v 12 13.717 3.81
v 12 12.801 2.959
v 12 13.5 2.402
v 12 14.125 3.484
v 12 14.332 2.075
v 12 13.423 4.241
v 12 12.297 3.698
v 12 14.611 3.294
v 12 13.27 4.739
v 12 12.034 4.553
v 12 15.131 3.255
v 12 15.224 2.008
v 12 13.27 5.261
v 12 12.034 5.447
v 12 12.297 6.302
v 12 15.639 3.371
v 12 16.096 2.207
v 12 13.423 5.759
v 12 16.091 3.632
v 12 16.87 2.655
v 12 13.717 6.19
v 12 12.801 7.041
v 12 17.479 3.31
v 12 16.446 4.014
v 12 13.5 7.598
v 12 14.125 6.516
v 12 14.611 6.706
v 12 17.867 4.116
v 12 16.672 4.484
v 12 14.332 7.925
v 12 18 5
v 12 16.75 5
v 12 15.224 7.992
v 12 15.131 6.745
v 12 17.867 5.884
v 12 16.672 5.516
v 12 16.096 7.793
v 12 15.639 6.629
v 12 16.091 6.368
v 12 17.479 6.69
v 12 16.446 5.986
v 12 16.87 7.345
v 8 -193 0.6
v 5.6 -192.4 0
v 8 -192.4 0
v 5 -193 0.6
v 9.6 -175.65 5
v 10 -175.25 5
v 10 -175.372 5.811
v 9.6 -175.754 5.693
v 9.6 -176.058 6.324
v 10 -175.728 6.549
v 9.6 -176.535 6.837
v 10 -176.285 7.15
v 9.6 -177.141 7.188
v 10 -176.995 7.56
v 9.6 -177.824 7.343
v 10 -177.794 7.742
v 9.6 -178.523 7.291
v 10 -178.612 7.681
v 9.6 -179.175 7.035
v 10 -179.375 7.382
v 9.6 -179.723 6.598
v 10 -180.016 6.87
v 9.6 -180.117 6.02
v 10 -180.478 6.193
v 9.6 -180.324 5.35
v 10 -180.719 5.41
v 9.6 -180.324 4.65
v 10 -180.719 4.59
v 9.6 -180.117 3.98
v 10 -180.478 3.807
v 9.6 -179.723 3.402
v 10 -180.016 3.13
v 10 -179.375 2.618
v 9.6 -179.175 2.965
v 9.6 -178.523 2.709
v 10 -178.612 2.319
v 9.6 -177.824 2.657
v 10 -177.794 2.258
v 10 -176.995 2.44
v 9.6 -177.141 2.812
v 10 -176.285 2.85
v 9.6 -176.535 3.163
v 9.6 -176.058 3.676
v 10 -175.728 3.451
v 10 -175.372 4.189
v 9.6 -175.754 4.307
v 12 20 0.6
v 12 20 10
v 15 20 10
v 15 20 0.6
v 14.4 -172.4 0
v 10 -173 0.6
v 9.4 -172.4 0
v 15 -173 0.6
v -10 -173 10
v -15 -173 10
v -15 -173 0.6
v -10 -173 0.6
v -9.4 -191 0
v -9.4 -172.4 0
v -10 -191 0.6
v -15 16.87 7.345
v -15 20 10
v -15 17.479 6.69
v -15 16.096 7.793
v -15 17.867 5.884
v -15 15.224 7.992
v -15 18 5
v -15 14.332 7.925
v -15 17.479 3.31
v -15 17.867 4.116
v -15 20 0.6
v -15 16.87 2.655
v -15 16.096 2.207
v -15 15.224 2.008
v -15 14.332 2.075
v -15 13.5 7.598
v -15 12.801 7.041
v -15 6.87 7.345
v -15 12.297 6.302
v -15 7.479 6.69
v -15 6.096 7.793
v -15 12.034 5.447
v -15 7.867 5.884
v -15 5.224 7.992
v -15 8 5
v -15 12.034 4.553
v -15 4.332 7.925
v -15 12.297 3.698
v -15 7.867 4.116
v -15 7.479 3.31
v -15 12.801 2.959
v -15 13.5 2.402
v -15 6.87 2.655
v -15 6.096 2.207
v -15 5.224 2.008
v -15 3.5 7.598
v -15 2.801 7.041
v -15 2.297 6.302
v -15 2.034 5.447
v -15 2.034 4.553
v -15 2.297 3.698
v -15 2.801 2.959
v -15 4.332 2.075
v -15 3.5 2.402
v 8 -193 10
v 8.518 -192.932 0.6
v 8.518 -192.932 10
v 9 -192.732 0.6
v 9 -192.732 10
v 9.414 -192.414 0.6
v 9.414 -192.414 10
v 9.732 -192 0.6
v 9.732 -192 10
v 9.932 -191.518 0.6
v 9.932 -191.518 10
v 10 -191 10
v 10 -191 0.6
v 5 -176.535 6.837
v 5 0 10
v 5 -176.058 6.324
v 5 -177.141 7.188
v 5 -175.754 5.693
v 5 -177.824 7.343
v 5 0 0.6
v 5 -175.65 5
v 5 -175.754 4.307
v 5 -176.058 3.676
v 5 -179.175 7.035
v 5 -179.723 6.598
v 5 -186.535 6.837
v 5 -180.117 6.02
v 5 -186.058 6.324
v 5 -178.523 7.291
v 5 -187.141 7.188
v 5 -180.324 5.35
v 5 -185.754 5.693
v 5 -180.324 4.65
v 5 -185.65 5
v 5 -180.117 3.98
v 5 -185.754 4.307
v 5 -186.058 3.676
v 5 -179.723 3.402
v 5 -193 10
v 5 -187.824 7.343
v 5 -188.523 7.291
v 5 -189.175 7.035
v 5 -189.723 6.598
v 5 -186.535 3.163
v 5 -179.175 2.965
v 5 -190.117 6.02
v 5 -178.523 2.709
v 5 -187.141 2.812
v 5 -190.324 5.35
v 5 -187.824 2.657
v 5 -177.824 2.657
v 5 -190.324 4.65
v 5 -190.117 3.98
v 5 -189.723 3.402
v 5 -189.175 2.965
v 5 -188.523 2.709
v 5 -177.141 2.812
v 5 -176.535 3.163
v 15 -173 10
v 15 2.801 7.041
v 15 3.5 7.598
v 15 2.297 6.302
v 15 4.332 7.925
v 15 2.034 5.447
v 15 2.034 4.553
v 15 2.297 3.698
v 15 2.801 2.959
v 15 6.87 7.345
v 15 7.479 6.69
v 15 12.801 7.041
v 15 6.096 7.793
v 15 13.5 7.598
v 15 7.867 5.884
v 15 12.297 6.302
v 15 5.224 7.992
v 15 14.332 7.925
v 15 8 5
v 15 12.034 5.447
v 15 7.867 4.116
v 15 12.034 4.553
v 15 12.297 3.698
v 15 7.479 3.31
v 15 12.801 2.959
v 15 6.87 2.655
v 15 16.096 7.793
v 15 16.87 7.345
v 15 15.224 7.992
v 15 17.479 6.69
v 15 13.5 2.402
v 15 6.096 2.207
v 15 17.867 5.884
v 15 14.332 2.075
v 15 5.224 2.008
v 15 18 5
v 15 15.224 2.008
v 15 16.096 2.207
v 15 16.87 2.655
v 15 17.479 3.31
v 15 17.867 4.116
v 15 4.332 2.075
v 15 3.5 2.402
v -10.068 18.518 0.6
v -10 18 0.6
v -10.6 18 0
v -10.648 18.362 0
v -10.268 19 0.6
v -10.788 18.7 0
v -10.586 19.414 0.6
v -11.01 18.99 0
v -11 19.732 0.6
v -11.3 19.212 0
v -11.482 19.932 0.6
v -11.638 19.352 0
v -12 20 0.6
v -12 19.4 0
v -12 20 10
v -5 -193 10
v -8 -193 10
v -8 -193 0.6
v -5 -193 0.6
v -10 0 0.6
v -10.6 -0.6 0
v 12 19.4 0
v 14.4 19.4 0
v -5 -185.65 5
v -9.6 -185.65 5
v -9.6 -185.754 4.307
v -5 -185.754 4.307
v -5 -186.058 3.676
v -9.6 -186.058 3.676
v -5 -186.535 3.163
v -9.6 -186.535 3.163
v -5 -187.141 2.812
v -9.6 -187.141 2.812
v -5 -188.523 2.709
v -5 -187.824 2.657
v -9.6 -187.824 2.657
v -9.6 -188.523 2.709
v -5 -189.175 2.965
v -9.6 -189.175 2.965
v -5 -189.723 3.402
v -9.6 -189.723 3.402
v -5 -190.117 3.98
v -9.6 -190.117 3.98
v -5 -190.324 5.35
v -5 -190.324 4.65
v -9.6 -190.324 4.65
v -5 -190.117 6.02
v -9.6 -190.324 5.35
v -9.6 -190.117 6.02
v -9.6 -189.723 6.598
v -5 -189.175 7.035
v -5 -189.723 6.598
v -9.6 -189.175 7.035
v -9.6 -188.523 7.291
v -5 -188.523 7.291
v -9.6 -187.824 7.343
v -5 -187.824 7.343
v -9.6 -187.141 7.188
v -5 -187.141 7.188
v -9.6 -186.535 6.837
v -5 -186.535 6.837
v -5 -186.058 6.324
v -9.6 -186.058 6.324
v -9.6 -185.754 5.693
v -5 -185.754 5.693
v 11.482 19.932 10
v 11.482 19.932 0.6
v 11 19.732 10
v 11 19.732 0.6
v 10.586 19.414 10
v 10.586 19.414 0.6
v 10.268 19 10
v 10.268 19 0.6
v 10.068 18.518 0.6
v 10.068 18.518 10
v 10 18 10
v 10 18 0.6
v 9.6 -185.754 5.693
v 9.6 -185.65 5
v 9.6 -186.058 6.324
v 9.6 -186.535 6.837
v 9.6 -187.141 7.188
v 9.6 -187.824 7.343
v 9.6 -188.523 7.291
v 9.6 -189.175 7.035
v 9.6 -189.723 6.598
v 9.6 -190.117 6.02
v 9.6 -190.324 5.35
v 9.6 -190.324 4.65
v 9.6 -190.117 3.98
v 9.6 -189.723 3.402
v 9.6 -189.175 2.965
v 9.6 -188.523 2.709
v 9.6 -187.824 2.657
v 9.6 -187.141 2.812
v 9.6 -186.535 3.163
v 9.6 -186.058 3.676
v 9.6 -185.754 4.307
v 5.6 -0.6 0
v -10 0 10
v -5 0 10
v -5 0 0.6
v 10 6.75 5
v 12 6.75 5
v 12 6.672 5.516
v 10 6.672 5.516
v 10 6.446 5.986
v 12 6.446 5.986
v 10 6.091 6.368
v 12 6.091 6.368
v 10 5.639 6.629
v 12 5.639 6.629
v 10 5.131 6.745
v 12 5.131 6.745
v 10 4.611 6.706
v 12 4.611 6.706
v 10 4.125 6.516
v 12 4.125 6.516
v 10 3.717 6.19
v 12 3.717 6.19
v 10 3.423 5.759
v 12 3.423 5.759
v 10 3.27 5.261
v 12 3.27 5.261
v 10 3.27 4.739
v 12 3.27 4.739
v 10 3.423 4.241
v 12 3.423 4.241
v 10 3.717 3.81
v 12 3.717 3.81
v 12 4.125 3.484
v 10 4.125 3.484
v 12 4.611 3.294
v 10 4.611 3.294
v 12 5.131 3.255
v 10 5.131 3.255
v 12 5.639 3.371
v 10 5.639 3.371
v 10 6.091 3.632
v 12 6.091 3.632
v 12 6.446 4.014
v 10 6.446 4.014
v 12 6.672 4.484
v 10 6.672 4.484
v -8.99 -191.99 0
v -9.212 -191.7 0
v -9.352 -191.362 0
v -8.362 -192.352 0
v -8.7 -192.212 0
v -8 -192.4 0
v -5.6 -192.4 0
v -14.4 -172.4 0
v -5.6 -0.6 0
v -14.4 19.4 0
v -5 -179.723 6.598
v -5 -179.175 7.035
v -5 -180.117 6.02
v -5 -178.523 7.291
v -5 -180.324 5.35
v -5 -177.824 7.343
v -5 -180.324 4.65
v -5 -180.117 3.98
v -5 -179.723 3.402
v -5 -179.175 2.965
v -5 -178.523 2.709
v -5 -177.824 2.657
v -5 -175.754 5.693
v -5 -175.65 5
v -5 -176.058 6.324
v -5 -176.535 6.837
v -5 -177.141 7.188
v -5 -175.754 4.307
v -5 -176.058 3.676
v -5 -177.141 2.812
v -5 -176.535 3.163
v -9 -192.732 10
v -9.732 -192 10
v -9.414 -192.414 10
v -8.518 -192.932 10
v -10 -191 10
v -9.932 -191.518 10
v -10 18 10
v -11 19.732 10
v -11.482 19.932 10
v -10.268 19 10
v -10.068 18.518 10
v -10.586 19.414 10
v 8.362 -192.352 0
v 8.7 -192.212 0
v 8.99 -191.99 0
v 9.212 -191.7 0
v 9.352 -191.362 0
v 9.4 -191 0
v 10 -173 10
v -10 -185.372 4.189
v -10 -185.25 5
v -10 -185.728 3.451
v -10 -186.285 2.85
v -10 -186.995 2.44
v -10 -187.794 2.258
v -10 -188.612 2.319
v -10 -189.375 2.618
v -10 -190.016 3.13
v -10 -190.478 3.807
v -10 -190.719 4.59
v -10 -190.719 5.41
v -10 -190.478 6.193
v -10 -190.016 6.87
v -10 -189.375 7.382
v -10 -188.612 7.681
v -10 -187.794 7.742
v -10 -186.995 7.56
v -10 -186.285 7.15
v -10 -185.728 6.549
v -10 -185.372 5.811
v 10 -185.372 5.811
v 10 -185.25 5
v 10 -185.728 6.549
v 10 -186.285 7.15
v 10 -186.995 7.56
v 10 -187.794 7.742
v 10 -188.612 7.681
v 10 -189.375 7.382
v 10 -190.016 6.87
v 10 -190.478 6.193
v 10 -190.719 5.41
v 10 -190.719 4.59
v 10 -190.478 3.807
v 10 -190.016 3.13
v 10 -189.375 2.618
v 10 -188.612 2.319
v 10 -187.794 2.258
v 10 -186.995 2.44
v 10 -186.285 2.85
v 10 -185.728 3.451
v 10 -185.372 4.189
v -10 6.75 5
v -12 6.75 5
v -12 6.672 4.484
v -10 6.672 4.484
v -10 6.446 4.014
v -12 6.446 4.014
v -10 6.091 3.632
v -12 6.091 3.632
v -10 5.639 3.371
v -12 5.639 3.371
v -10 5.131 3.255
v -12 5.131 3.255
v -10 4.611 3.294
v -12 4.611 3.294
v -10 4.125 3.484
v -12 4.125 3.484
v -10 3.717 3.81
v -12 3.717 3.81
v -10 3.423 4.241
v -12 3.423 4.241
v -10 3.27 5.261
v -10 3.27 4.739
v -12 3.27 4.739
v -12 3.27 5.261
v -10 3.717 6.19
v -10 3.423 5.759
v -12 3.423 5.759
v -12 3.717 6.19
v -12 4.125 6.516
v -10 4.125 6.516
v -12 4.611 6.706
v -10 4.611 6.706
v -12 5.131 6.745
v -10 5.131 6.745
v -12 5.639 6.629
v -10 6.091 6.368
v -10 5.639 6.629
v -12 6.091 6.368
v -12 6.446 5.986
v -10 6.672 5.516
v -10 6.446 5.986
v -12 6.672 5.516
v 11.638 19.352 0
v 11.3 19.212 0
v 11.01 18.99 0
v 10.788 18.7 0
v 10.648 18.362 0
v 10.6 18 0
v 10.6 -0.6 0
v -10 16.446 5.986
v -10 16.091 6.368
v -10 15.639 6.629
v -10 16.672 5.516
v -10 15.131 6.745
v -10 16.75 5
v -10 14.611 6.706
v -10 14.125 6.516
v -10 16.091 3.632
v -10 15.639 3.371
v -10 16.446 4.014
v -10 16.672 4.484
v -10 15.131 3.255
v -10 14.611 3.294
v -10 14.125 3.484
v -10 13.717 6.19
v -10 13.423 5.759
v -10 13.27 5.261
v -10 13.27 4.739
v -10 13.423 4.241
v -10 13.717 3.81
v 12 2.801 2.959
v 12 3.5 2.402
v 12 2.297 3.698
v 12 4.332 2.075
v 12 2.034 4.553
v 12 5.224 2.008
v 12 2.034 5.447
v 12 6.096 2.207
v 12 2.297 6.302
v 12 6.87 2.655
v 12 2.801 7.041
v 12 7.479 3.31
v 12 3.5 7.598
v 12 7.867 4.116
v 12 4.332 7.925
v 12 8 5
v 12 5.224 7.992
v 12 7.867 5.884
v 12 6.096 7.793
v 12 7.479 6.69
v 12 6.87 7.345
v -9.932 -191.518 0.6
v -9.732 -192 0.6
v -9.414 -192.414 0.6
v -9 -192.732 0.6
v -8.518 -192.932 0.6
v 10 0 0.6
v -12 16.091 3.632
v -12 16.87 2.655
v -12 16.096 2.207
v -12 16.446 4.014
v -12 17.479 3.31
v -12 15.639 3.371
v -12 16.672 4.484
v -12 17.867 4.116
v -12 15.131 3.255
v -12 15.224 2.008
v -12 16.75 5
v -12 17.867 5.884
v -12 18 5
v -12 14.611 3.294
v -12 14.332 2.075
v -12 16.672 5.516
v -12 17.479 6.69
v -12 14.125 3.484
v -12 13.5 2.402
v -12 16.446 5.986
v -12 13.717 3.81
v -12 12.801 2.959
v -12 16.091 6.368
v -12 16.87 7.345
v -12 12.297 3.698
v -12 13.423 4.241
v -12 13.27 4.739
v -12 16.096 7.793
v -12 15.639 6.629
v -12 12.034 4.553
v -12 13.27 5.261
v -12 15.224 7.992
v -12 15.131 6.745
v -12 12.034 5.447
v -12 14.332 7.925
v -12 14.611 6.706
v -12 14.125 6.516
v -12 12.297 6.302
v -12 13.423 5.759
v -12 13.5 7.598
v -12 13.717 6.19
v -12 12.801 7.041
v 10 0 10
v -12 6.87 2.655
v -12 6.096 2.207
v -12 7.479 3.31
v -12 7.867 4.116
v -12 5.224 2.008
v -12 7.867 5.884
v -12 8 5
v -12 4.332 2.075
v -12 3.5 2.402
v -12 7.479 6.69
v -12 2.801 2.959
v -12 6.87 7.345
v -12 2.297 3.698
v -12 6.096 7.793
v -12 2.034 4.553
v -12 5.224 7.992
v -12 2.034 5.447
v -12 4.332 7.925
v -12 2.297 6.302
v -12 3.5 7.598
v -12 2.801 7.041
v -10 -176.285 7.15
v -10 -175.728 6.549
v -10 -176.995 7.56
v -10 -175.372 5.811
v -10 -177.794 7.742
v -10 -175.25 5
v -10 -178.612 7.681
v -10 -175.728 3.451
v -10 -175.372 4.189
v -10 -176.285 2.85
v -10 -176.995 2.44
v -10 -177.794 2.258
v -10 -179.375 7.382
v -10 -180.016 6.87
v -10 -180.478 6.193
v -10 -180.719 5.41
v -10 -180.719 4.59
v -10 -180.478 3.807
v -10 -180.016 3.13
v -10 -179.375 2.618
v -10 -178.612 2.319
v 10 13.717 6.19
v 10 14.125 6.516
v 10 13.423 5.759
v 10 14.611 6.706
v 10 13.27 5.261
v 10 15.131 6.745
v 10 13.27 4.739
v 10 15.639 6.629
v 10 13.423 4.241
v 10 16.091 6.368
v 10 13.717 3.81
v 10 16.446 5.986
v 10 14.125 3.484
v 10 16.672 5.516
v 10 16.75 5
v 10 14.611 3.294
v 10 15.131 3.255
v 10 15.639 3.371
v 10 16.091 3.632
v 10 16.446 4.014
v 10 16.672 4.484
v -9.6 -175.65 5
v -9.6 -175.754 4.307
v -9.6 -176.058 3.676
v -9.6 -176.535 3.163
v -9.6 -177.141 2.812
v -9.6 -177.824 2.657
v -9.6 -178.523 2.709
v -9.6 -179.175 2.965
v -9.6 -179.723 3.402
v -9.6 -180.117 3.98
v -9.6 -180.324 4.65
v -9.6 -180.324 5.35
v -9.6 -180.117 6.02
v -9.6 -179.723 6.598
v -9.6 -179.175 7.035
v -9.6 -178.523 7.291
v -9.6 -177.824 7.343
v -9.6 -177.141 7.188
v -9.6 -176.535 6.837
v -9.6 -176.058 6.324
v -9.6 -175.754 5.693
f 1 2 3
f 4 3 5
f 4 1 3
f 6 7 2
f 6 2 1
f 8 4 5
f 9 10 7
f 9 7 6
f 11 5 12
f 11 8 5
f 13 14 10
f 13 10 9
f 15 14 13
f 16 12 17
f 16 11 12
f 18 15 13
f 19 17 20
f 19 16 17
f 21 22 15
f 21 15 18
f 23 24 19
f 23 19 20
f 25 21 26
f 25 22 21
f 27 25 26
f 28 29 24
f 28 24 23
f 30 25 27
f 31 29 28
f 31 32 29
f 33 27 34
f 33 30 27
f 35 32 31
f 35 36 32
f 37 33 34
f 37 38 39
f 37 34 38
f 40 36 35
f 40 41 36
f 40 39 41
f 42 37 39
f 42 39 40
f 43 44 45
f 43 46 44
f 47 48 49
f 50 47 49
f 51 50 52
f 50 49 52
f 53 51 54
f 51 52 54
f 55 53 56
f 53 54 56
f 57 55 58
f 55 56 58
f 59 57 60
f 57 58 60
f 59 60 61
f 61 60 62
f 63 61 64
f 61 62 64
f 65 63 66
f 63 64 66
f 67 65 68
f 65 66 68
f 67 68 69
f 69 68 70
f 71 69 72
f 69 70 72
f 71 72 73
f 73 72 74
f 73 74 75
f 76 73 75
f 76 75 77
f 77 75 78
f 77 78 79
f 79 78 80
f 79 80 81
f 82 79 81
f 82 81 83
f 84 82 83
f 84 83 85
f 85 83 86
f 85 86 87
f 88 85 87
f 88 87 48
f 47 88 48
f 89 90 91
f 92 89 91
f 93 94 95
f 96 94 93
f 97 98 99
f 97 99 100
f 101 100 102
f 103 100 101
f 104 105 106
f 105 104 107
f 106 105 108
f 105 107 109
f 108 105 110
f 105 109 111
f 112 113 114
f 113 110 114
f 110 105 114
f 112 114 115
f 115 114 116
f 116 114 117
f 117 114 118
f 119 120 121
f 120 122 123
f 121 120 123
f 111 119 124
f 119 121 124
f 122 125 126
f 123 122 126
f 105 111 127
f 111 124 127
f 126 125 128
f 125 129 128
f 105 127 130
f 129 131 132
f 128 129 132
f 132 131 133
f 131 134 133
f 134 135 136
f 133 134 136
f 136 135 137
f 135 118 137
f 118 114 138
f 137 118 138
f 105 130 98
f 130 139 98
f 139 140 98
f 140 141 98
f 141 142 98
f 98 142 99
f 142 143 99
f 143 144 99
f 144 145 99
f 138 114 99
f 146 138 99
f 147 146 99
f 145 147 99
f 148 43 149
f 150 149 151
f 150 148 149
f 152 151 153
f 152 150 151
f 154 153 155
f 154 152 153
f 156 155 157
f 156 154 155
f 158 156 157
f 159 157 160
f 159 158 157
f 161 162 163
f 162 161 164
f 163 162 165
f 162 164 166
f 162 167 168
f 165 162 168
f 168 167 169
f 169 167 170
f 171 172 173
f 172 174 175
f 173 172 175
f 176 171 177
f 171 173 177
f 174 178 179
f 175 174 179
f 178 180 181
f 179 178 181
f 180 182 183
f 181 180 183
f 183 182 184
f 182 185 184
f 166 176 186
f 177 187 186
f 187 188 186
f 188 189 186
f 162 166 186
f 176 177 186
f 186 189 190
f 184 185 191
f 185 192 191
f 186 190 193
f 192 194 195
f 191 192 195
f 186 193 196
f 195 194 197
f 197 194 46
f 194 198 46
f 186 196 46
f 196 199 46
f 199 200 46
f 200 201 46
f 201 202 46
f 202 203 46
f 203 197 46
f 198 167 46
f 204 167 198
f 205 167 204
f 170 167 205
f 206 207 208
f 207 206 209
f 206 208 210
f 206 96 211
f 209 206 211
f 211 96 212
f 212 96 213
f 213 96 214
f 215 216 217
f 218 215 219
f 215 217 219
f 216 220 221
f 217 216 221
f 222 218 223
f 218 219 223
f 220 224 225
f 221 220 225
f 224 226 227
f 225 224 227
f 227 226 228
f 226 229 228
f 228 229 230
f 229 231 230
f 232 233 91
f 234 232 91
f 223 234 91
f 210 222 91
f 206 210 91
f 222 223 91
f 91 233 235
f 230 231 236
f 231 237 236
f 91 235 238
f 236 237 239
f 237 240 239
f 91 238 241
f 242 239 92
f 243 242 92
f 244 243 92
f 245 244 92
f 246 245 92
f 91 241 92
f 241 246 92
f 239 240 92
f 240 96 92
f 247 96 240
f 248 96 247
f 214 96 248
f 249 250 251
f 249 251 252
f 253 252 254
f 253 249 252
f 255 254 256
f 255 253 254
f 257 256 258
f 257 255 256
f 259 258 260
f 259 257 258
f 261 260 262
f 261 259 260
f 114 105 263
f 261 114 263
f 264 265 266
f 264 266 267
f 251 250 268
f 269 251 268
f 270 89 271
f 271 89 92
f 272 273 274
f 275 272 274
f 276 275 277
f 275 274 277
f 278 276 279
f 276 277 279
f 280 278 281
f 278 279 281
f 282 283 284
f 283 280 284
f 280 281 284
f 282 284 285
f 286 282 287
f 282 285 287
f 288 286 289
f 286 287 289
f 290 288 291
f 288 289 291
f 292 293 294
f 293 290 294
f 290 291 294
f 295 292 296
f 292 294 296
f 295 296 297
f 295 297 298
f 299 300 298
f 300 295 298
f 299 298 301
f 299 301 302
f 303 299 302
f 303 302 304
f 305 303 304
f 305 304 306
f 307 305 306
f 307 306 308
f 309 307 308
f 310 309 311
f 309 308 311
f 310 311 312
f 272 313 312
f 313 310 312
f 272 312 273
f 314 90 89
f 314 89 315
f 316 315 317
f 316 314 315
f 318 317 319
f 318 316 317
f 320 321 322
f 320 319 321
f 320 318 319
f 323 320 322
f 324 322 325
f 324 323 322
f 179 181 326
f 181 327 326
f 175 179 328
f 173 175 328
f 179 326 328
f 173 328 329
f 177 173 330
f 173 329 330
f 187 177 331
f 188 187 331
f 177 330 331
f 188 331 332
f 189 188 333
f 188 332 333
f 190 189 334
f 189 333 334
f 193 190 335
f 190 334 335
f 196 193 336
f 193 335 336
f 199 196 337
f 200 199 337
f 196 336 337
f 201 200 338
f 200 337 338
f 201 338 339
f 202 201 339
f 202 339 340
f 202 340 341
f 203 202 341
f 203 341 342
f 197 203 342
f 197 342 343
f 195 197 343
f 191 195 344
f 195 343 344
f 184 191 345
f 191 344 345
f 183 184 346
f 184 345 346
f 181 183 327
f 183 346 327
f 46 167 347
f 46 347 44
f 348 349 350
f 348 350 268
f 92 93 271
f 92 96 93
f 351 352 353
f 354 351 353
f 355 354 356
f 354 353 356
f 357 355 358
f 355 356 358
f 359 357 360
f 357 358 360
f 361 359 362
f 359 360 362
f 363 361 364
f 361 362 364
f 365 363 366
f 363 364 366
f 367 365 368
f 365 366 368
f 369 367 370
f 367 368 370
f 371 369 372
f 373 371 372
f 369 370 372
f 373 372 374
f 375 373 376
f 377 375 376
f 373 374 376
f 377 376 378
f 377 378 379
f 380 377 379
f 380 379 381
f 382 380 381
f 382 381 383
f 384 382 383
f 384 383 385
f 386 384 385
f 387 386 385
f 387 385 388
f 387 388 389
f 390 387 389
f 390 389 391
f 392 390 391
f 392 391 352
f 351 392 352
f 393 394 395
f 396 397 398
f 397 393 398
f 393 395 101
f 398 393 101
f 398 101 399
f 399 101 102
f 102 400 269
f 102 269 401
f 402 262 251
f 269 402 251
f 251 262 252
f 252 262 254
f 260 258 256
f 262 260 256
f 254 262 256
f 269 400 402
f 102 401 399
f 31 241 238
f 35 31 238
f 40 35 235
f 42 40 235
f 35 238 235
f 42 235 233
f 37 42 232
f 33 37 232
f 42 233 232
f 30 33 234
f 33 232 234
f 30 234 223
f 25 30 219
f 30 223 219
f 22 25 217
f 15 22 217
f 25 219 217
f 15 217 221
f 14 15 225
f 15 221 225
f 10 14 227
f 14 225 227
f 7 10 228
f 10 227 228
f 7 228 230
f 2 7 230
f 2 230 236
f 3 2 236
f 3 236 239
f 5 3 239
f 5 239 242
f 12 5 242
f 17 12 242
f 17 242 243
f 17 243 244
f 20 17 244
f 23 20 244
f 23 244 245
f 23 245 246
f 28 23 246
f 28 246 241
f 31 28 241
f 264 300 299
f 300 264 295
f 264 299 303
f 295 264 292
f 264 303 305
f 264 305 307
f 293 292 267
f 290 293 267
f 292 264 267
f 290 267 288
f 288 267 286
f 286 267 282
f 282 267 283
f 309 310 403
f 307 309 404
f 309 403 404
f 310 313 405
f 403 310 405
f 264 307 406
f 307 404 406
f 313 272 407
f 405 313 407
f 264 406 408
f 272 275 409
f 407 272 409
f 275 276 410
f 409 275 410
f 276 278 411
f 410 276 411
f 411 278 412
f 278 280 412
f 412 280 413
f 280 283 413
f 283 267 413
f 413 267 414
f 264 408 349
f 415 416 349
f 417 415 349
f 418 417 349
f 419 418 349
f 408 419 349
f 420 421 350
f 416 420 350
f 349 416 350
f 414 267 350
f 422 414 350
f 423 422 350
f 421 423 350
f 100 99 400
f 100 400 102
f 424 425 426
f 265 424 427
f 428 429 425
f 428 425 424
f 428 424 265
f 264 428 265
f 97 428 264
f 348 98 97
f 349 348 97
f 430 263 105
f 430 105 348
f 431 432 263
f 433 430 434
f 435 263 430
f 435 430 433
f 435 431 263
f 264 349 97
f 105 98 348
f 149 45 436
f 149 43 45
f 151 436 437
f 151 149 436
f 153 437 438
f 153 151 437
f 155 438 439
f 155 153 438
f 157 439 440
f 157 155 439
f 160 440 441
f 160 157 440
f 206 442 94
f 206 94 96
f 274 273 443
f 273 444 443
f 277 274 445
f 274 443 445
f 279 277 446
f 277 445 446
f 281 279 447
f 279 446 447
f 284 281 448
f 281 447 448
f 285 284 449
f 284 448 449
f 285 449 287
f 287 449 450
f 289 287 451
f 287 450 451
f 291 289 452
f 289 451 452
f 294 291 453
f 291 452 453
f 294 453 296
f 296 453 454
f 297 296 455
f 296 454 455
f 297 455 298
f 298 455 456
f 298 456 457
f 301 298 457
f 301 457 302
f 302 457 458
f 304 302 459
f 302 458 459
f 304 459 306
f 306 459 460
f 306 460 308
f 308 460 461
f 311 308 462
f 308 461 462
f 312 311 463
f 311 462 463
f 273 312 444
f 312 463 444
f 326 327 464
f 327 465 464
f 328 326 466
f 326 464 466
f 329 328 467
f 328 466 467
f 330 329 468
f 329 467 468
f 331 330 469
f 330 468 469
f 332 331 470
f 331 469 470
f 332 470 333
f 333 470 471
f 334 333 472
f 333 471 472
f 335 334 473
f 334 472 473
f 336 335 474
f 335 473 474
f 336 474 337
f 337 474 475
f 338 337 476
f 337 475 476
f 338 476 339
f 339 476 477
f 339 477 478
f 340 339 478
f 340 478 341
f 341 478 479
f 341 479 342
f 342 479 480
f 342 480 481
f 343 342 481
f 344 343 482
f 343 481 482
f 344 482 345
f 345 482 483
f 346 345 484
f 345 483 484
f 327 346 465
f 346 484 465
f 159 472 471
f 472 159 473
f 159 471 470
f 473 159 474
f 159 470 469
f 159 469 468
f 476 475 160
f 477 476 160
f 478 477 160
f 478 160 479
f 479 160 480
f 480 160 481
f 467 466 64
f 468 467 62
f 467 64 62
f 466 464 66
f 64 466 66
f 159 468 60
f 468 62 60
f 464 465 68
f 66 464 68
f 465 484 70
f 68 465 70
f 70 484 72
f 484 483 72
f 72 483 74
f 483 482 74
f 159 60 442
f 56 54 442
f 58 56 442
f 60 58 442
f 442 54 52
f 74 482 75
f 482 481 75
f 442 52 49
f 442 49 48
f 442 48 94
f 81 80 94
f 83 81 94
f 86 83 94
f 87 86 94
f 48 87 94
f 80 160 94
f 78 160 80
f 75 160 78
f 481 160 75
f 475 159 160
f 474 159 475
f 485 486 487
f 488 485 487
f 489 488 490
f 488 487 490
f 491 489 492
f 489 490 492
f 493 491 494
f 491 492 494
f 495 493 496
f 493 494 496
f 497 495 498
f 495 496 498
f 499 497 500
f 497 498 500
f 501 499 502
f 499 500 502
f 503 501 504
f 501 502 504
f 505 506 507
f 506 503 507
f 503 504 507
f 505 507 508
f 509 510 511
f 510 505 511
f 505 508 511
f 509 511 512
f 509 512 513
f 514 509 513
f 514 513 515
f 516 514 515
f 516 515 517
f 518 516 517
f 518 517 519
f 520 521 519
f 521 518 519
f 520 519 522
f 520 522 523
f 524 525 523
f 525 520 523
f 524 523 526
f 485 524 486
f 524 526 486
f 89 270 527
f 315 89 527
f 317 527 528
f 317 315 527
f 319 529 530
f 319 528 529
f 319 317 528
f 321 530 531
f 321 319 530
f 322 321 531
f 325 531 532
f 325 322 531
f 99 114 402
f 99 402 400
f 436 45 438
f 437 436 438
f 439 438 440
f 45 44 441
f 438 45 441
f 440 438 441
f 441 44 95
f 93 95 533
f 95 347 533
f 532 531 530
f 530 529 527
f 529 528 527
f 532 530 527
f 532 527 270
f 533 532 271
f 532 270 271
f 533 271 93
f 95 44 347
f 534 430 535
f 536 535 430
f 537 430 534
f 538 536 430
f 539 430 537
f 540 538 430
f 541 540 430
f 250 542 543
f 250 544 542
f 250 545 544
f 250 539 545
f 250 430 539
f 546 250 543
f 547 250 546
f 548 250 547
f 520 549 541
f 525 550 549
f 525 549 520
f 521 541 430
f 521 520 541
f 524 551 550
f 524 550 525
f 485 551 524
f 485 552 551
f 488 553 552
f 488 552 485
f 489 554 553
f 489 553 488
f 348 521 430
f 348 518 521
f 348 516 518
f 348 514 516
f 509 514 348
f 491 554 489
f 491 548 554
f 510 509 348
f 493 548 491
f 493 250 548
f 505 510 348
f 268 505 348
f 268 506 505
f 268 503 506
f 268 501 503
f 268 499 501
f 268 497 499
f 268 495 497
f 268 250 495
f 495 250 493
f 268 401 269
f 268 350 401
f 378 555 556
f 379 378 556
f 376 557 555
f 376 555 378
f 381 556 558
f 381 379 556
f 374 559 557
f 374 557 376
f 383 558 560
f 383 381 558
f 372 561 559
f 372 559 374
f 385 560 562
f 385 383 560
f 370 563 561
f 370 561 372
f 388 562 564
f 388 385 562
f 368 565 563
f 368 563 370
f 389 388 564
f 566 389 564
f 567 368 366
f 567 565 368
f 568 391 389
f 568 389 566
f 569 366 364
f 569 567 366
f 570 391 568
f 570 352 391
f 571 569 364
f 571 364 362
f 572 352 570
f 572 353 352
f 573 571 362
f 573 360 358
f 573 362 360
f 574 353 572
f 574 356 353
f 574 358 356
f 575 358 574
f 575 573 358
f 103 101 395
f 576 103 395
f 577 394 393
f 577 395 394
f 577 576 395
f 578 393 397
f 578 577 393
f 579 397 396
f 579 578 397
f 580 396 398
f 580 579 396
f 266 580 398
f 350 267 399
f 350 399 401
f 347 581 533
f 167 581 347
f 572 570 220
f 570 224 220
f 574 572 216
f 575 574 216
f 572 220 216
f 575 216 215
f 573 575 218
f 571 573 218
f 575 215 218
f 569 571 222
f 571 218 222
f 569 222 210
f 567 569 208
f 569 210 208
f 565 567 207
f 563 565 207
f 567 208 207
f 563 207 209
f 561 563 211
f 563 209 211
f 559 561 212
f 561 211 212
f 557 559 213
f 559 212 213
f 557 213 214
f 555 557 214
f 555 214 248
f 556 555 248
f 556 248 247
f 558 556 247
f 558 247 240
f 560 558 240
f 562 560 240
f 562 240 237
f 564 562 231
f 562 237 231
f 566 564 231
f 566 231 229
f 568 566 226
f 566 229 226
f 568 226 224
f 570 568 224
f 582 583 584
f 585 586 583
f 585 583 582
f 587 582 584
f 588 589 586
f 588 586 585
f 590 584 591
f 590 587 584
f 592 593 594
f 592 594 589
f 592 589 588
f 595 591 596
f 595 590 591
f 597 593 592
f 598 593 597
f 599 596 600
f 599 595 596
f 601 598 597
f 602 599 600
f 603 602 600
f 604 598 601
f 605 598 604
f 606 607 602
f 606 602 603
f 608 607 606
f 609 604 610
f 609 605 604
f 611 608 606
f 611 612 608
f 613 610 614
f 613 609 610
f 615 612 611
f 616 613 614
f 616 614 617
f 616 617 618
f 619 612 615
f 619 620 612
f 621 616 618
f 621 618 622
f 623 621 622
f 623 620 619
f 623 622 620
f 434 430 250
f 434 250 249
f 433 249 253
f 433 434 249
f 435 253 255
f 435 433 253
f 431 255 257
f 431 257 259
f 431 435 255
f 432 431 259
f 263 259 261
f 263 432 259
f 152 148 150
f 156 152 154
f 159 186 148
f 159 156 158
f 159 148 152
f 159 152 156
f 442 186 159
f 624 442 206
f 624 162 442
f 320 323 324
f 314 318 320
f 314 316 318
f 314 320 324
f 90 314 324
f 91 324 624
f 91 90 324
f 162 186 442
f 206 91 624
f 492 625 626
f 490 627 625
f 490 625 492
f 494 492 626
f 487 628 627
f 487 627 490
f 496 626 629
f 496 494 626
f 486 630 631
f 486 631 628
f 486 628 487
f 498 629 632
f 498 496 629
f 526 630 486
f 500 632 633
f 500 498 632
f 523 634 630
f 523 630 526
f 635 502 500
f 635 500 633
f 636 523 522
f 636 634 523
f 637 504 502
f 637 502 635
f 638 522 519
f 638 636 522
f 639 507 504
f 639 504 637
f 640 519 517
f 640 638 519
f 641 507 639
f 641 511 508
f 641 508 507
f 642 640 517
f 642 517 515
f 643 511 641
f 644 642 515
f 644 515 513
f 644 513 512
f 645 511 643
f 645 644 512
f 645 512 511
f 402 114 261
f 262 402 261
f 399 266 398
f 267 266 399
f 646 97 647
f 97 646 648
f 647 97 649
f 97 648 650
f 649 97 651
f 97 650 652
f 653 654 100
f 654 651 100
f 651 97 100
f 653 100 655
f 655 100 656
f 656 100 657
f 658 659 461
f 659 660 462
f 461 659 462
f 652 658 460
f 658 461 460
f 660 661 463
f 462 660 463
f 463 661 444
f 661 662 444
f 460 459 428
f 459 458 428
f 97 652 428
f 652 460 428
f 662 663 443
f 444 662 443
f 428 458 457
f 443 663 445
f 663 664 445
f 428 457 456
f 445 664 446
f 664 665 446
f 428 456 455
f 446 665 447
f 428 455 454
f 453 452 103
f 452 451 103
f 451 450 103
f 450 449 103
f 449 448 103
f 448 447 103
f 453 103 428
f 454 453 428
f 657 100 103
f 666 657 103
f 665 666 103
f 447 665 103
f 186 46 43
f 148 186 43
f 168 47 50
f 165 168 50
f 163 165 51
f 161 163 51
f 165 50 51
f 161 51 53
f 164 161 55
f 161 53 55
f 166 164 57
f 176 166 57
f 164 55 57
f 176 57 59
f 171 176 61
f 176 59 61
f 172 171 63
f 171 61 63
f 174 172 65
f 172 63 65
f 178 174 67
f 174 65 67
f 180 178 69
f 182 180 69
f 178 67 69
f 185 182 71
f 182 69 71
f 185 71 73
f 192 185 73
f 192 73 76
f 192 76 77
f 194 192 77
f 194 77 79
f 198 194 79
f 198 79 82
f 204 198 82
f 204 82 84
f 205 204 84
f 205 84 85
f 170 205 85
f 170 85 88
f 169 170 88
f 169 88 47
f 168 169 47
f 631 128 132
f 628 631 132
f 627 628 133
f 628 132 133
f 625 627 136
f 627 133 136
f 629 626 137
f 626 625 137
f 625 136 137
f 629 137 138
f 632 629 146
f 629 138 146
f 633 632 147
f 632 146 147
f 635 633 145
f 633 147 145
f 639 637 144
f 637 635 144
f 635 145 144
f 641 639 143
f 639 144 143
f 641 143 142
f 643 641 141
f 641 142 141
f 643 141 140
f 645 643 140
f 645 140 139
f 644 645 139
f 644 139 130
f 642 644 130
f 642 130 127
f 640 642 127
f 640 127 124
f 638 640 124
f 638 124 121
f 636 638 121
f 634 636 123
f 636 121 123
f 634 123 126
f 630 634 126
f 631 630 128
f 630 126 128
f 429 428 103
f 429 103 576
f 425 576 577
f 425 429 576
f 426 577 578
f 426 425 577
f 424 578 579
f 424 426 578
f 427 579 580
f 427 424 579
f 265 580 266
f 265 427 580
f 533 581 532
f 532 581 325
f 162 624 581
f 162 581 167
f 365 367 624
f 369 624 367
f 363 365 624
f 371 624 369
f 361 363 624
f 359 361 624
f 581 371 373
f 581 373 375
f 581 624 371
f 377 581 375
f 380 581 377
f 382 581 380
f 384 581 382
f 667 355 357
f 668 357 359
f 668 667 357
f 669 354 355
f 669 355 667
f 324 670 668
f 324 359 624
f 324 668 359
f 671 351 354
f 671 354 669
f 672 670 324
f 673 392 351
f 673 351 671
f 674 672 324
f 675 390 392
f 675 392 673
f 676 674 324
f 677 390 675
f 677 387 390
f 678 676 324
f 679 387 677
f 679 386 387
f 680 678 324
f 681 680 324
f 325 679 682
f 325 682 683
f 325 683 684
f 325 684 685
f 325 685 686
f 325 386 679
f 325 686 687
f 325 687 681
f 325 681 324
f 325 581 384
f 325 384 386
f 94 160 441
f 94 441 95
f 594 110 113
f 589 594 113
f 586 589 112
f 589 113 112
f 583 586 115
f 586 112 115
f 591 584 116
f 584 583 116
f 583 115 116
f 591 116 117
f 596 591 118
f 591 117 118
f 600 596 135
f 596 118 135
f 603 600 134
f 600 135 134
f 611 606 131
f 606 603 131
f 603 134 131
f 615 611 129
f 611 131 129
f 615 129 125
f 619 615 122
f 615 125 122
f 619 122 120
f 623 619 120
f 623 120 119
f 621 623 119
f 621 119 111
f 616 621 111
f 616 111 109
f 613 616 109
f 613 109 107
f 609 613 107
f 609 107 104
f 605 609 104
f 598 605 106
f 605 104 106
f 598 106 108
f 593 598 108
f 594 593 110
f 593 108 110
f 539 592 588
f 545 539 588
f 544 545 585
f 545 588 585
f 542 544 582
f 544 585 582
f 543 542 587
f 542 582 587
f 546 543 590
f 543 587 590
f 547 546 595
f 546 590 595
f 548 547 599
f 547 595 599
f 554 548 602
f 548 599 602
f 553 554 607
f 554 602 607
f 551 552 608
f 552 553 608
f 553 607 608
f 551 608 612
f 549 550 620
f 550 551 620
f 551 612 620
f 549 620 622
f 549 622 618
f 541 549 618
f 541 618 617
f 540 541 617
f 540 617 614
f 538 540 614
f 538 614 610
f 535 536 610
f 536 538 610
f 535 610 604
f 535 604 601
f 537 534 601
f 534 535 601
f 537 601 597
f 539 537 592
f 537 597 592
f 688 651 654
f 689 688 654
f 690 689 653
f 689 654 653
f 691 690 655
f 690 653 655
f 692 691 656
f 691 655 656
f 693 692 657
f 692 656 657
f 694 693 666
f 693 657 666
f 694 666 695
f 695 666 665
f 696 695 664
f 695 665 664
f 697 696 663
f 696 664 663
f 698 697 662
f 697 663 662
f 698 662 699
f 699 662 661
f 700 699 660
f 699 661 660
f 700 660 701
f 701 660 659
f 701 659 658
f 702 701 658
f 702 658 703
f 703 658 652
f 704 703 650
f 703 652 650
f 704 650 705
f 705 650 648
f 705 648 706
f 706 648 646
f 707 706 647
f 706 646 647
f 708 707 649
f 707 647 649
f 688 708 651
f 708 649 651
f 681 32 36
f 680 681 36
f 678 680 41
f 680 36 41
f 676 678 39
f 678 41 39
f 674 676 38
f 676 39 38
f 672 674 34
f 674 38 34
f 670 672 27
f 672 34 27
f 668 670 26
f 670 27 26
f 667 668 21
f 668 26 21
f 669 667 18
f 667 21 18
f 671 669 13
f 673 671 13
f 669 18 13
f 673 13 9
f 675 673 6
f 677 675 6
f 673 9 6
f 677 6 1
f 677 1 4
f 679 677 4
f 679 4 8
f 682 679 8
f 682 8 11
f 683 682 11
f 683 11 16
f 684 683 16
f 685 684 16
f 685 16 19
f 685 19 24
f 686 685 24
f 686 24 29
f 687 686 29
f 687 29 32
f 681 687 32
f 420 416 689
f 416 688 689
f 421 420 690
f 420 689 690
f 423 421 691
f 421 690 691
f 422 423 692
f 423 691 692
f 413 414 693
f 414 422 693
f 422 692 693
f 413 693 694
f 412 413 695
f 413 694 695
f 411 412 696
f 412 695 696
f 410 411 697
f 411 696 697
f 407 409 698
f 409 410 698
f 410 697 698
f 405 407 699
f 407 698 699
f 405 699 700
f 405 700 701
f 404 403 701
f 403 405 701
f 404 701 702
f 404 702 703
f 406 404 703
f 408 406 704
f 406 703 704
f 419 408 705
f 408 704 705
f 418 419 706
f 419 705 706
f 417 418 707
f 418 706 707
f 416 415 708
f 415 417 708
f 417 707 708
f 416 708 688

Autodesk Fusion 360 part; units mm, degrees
sketch "Sketch1" plane through (0, 0, 0) normal (0, 0, 1) x (1, 0, 0)
  line L0 (0, 0) -> (5, 0) construction
  line L1 (5, 0) -> (5, -193)
  line L2 (5, -193) -> (10, -193)
  line L3 (10, -193) -> (10, -173)
  line L4 (10, -173) -> (15, -173)
  line L5 (15, -173) -> (15, 20)
  line L6 (10, 0) -> (5, 0)
  line L7 (10, 0) -> (10, 20)
  line L8 (10, 20) -> (15, 20)
  dimension "d1" = 5
  dimension "d3" = 5
  dimension "d5" = 5
  dimension "d8" = 20
  dimension "d16" = 20
  dimension "d17" = 5
  dimension "d36" = 173
extrude "Extrude1" add sketch "Sketch1" along normal blind 10 makes body 1
sketch "Sketch5" plane through (10, 0, 0) normal (1, 0, 0) x (0, 1, 0)
  line L0 (-193, 0) -> (-173, 0)
  line L1 (-173, 0) -> (-173, 10)
  line L2 (-173, 10) -> (-193, 10)
  line L3 (-193, 10) -> (-193, 0)
  line L4 (-173, 5) -> (-193, 5) construction
  line L5 (-183, 5) -> (-183, 10) construction
  circle A0 centre (-178, 5) radius 2.35
  circle A1 centre (-188, 5) radius 2.35
  dimension "d27" = 4.7
  dimension "d29" = 5
extrude "Extrude6" cut sketch "Sketch5" against normal up to surface (5 mm away) contours A0 | A1 bodies 1
sketch "Sketch4" plane through (15, 0, 0) normal (1, 0, 0) x (0, 1, 0)
  line L0 (-173, 0) -> (20, 0)
  line L1 (20, 0) -> (20, 10)
  line L2 (20, 10) -> (-173, 10)
  line L3 (-173, 10) -> (-173, 0)
  line L4 (0, 0) -> (0, 10)
  line L5 (0, 5) -> (20, 5) construction
  line L6 (10, 5) -> (10, 10) construction
  circle A0 centre (5, 5) radius 1.75
  circle A1 centre (5, 5) radius 3
  circle A2 centre (15, 5) radius 3
  circle A3 centre (15, 5) radius 1.75
  dimension "d18" = 3.5
  dimension "d19" = 6
  dimension "d20" = 5
extrude "Extrude4" cut sketch "Sketch4" against normal up to surface (5 mm away) contours A0 | A3 bodies 1
extrude "Extrude5" cut sketch "Sketch4" against normal blind 3 contours A1 | A2 bodies 1
chamfer "Chamfer1" distance 0.4 angle 45 2 edges at (10, -190.191, 5.8498) (10, -180.191, 5.8498) on bodies 1
fillet "Fillet1" radius 2 2 edges at (10, -193, 5) (10, 20, 5) on bodies 1
chamfer "Chamfer2" distance 0.6 angle 45 1 faces at (6.6667, -122, 0) on bodies 1
mirror "Mirror1" about plane through (0, 0, 0) normal (1, 0, 0) of bodies 1 makes body 2
